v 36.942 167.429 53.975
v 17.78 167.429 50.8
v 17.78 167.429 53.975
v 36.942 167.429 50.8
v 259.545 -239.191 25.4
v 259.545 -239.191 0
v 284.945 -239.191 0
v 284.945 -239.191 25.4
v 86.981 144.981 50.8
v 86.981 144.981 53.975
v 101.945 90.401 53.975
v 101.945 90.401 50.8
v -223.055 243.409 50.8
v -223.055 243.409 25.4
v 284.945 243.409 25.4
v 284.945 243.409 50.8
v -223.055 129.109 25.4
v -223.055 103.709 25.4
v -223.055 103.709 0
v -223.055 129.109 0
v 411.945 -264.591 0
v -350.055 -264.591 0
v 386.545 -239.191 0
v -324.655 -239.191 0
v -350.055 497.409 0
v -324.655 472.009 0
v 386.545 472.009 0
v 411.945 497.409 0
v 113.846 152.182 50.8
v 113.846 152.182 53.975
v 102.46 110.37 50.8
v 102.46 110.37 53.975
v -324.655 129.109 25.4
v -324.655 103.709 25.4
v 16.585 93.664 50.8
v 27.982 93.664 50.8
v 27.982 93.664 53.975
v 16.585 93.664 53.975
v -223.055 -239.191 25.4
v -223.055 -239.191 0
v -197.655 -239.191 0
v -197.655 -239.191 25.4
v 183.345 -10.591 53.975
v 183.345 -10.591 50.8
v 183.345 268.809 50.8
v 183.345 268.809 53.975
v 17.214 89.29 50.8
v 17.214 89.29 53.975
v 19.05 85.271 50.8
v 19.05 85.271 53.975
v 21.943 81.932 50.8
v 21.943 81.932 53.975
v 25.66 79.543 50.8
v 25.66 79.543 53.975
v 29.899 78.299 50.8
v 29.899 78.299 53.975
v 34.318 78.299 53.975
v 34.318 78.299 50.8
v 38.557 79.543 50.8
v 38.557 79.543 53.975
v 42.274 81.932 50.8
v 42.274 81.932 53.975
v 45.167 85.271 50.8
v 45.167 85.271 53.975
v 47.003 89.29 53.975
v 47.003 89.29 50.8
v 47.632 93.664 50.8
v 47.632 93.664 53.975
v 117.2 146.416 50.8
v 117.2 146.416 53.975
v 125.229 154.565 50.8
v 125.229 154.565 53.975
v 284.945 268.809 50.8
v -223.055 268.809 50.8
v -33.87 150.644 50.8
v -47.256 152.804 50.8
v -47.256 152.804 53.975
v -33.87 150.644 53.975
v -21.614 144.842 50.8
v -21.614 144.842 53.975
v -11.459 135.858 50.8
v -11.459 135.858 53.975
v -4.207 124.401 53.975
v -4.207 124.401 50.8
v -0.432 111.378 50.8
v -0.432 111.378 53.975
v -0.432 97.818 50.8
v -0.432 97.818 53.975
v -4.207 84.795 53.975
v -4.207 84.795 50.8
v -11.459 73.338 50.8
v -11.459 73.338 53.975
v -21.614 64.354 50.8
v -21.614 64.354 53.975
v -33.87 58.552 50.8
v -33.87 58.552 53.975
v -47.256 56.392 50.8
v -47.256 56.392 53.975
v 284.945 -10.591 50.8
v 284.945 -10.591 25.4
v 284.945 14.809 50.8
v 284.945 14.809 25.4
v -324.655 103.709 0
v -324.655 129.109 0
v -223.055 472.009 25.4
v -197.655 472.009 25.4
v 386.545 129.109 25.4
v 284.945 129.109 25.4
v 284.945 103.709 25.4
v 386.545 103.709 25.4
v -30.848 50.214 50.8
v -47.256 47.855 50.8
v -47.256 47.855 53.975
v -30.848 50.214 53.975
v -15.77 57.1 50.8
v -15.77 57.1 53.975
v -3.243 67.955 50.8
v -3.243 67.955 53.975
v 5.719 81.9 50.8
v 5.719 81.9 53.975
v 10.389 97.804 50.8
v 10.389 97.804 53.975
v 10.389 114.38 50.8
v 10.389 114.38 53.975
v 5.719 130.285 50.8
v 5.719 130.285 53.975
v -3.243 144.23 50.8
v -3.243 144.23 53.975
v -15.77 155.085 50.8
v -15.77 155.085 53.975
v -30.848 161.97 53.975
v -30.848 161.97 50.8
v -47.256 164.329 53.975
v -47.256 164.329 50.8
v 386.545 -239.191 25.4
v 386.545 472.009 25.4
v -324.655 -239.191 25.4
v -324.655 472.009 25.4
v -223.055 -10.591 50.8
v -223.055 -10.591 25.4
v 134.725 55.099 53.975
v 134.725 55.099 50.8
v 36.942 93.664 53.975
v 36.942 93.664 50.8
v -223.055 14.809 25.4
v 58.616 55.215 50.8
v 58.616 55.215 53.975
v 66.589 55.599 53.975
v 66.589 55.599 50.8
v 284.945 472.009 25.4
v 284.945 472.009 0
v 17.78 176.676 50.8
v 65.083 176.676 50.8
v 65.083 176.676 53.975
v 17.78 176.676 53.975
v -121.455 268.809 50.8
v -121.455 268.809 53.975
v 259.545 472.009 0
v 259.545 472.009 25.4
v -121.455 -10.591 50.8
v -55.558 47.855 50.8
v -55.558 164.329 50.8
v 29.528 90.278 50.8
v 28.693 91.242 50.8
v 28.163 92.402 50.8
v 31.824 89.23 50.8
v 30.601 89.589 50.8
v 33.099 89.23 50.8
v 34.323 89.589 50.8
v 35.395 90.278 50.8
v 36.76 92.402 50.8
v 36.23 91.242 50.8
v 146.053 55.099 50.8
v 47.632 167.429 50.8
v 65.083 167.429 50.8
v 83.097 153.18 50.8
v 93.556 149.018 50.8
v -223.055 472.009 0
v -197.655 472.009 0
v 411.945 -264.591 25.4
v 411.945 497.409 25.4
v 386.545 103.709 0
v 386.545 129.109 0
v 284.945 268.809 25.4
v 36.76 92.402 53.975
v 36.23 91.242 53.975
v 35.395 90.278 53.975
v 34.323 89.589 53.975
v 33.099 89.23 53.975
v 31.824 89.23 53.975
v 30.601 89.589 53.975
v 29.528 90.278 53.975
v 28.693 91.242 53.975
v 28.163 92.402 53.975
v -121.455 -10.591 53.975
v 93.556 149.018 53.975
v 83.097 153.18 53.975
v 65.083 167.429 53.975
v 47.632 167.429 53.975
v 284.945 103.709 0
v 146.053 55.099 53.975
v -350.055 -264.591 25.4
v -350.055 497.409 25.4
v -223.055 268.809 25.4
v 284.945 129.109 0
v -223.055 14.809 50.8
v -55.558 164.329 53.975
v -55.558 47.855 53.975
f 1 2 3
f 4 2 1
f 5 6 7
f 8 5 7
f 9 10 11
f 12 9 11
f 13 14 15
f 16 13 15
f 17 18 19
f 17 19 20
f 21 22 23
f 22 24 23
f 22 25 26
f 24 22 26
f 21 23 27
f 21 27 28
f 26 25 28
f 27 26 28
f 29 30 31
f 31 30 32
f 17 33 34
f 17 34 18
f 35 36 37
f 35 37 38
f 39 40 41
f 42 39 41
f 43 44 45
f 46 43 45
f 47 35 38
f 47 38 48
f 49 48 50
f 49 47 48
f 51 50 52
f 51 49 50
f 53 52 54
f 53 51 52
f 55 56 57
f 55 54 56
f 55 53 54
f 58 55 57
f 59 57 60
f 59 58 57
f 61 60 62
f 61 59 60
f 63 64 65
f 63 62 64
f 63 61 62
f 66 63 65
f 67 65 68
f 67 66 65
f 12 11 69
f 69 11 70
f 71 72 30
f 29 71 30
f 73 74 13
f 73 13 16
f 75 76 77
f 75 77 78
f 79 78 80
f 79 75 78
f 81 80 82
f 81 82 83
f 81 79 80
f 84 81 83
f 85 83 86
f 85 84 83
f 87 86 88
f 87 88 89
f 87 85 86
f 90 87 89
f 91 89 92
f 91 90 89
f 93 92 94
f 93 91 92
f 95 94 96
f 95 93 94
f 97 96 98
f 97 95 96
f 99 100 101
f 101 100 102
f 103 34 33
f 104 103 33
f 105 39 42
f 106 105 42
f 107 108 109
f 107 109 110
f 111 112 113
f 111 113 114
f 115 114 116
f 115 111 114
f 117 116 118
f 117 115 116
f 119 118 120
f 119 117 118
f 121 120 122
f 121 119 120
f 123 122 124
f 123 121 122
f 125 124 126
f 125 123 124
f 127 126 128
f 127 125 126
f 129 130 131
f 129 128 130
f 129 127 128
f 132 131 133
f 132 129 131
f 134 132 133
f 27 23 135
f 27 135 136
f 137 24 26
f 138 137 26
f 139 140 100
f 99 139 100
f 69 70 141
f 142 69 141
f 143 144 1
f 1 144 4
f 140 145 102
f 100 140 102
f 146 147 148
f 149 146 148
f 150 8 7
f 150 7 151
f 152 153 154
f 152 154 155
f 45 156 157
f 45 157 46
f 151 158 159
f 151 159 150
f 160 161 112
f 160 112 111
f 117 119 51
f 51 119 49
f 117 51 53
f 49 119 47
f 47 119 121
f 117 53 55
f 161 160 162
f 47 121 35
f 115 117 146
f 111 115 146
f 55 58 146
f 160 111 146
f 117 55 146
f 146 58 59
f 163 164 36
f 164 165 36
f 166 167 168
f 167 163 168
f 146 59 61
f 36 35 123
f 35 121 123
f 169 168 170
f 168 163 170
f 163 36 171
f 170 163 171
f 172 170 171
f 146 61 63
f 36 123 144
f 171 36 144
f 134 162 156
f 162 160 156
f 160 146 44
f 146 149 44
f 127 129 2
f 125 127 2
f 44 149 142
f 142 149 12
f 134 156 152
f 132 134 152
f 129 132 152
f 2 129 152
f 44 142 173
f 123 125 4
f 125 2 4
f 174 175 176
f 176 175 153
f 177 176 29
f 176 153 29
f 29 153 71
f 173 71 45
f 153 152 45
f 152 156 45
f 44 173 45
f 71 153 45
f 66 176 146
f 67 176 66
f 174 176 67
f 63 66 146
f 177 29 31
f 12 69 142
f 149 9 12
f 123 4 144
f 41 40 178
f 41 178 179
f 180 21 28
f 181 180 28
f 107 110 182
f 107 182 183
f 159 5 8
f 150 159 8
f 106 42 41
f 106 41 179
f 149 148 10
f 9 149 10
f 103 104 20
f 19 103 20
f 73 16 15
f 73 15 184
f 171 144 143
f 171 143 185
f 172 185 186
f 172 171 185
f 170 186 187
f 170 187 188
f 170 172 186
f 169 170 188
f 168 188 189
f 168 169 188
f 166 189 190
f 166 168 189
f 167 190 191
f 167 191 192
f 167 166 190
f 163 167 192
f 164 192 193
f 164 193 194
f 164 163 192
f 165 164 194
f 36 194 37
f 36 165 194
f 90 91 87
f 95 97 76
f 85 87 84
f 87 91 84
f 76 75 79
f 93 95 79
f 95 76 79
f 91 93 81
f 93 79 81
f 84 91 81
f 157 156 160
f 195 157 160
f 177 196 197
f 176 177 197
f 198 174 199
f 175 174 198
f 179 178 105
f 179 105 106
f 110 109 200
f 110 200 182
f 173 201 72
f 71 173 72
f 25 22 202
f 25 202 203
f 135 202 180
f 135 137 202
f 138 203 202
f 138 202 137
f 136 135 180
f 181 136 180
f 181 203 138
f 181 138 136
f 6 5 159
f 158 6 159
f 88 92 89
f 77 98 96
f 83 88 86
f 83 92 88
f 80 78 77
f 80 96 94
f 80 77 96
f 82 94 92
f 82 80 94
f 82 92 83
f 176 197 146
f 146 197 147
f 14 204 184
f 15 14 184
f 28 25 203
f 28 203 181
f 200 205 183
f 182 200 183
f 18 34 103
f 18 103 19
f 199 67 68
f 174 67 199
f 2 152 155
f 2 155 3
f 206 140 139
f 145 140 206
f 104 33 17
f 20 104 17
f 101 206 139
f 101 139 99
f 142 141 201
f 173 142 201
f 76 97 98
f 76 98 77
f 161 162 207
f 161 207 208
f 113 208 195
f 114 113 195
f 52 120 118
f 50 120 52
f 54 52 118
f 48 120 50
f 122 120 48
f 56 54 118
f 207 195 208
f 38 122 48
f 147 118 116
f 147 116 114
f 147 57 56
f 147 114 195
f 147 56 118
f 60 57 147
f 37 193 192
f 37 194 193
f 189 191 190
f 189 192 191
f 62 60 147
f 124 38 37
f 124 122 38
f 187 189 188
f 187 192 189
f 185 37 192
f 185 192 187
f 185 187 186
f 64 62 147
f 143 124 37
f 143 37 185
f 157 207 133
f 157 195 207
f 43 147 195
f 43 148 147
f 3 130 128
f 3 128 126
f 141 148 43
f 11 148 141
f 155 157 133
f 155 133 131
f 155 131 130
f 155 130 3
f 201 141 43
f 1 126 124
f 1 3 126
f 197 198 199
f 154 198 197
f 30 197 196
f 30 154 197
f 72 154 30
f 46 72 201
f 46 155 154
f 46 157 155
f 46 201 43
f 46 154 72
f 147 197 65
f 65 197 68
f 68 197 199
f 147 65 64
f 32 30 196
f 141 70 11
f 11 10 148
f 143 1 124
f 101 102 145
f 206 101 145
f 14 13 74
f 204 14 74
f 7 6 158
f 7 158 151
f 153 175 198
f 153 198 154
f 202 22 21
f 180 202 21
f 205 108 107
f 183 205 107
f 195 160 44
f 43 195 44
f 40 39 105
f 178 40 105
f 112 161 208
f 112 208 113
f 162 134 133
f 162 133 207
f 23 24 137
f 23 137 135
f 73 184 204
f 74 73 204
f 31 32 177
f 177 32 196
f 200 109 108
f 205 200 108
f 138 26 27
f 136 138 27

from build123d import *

# Parameters (mm, degrees)
F0_W      = 762
F0_H      = 762
F0_W_2    = 711.2
F0_H_2    = 711.2
F1_DEPTH  = 25.4
F2_W      = 25.4
F2_H      = 711.2
F3_DEPTH  = 25.4
F4_W      = 482.6
F4_H      = 25.4
F4_W_2    = 25.4
F5_DEPTH  = 25.4
F6_W      = 101.6
F6_H      = 25.4
F7_DEPTH  = 25.4
F8_W      = 304.8
F8_H      = 25.4
F8_H_2    = 254
F9_DEPTH  = 3.175
F10_W     = 10.6899626553
F10_H     = 73.765091598
F11_DEPTH = 12.7


with BuildPart() as f1:
    # F0 (on Top) → F1 (new body)
    with BuildSketch(Plane.XY):
        with Locations((30.9446323663, 116.409232023)):
            Rectangle(F0_W, F0_H)
        with Locations((30.9446323663, 116.409232023)):
            Rectangle(F0_W_2, F0_H_2, mode=Mode.SUBTRACT)
    extrude(amount=F1_DEPTH)


with BuildPart() as f3:
    # F2 (on face) → F3 (new body)
    with BuildSketch(Plane.XY.offset(25.4)):
        with Locations((272.2446323663, 116.409232023)):
            Rectangle(F2_W, F2_H)
    extrude(amount=-F3_DEPTH)


with BuildPart() as f3b:
    # F2 (on face) → F3, piece 2 (new body)
    with BuildSketch(Plane.XY.offset(25.4)):
        with Locations((-210.3553676337, 116.409232023)):
            Rectangle(F2_W, F2_H)
    extrude(amount=-F3_DEPTH)


with BuildPart() as f5:
    # F4 (on face) → F5 (new body)
    with BuildSketch(Plane.XY.offset(25.4)):
        with Locations((43.6446323663, 2.109232023)):
            Rectangle(F4_W, F4_H)
        with Locations((-210.3553676337, 2.109232023)):
            Rectangle(F4_W_2, F4_H)
    extrude(amount=F5_DEPTH)


with BuildPart() as f5b:
    # F4 (on face) → F5, piece 2 (new body)
    with BuildSketch(Plane.XY.offset(25.4)):
        with Locations((43.6446323663, 256.109232023)):
            Rectangle(F4_W, F4_H)
        with Locations((-210.3553676337, 256.109232023)):
            Rectangle(F4_W_2, F4_H)
    extrude(amount=F5_DEPTH)


with BuildPart() as f7:
    # F6 (on face) → F7 (new body)
    with BuildSketch(Plane.XY.offset(25.4)):
        with Locations((335.7446323663, 116.409232023)):
            Rectangle(F6_W, F6_H)
    extrude(amount=-F7_DEPTH)


with BuildPart() as f7b:
    # F6 (on face) → F7, piece 2 (new body)
    with BuildSketch(Plane.XY.offset(25.4)):
        with Locations((-273.8553676337, 116.409232023)):
            Rectangle(F6_W, F6_H)
    extrude(amount=-F7_DEPTH)


with BuildPart() as f9:
    # F8 (on face) → F9 (new body)
    with BuildSketch(Plane.XY.offset(50.8)):
        with Locations((30.9446323663, 2.109232023)):
            Rectangle(F8_W, F8_H)
        with Locations((30.9446323663, 141.809232023)):
            Rectangle(F8_W, F8_H_2)
    extrude(amount=F9_DEPTH)

    # F10 (on face) → F11 (cut, symmetric)
    with BuildSketch(Plane.XY.offset(53.975)):
        Polygon((-47.2557544708, 164.3294990063), (-55.5580370128, 164.3294990063), (-55.5580370128, 47.8553287685), (-47.2557544708, 47.8553287685), (-47.2557544708, 56.3918836415), (-47.2557544708, 152.8043150902), align=None)
        with BuildLine():
            ThreePointArc((-47.2557544708, 47.8553287685), (10.9813306481, 106.0924138874), (-47.2557544708, 164.3294990063))
            Line((-47.2557544708, 164.3294990063), (-47.2557544708, 152.8043150902))
            ThreePointArc((-47.2557544708, 152.8043150902), (0.0474647178, 104.5980993658), (-47.2557544708, 56.3918836415))
            Line((-47.2557544708, 56.3918836415), (-47.2557544708, 47.8553287685))
        make_face()
        with Locations((42.2865953296, 130.5462755263)):
            Rectangle(F10_W, F10_H)
        Polygon((65.0834441185, 176.6757965088), (17.7797805518, 176.6757965088), (17.7797805518, 167.4288213253), (36.941614002, 167.4288213253), (47.6315766573, 167.4288213253), (65.0834441185, 167.4288213253), align=None)
        with BuildLine():
            Line((47.6315766573, 93.6637297273), (36.941614002, 93.6637297273))
            ThreePointArc((36.941614002, 93.6637297273), (32.4617940933, 89.1839098185), (27.9819741845, 93.6637297273))
            Line((27.9819741845, 93.6637297273), (16.5853984654, 93.6637297273))
            ThreePointArc((16.5853984654, 93.6637297273), (32.1084875613, 78.1406406313), (47.6315766573, 93.6637297273))
        make_face()
        Polygon((58.616489172, 55.2153401077), (66.5894523263, 55.5991791189), (86.9810134172, 144.9812352657), (101.9450649619, 90.4011502862), (117.1996220946, 146.4159190655), (134.7245126963, 55.0988465548), (146.0527032614, 55.0988465548), (125.2292245626, 154.5646637678), (113.8464854443, 152.1816518728), (102.4598643225, 110.3699529974), (93.5559123755, 149.0179747343), (83.0970257521, 153.1798094511), align=None)
    extrude(amount=F11_DEPTH, both=True, mode=Mode.SUBTRACT)


solid = Compound([f1.part, f3.part, f3b.part, f5.part, f5b.part, f7.part, f7b.part, f9.part])
